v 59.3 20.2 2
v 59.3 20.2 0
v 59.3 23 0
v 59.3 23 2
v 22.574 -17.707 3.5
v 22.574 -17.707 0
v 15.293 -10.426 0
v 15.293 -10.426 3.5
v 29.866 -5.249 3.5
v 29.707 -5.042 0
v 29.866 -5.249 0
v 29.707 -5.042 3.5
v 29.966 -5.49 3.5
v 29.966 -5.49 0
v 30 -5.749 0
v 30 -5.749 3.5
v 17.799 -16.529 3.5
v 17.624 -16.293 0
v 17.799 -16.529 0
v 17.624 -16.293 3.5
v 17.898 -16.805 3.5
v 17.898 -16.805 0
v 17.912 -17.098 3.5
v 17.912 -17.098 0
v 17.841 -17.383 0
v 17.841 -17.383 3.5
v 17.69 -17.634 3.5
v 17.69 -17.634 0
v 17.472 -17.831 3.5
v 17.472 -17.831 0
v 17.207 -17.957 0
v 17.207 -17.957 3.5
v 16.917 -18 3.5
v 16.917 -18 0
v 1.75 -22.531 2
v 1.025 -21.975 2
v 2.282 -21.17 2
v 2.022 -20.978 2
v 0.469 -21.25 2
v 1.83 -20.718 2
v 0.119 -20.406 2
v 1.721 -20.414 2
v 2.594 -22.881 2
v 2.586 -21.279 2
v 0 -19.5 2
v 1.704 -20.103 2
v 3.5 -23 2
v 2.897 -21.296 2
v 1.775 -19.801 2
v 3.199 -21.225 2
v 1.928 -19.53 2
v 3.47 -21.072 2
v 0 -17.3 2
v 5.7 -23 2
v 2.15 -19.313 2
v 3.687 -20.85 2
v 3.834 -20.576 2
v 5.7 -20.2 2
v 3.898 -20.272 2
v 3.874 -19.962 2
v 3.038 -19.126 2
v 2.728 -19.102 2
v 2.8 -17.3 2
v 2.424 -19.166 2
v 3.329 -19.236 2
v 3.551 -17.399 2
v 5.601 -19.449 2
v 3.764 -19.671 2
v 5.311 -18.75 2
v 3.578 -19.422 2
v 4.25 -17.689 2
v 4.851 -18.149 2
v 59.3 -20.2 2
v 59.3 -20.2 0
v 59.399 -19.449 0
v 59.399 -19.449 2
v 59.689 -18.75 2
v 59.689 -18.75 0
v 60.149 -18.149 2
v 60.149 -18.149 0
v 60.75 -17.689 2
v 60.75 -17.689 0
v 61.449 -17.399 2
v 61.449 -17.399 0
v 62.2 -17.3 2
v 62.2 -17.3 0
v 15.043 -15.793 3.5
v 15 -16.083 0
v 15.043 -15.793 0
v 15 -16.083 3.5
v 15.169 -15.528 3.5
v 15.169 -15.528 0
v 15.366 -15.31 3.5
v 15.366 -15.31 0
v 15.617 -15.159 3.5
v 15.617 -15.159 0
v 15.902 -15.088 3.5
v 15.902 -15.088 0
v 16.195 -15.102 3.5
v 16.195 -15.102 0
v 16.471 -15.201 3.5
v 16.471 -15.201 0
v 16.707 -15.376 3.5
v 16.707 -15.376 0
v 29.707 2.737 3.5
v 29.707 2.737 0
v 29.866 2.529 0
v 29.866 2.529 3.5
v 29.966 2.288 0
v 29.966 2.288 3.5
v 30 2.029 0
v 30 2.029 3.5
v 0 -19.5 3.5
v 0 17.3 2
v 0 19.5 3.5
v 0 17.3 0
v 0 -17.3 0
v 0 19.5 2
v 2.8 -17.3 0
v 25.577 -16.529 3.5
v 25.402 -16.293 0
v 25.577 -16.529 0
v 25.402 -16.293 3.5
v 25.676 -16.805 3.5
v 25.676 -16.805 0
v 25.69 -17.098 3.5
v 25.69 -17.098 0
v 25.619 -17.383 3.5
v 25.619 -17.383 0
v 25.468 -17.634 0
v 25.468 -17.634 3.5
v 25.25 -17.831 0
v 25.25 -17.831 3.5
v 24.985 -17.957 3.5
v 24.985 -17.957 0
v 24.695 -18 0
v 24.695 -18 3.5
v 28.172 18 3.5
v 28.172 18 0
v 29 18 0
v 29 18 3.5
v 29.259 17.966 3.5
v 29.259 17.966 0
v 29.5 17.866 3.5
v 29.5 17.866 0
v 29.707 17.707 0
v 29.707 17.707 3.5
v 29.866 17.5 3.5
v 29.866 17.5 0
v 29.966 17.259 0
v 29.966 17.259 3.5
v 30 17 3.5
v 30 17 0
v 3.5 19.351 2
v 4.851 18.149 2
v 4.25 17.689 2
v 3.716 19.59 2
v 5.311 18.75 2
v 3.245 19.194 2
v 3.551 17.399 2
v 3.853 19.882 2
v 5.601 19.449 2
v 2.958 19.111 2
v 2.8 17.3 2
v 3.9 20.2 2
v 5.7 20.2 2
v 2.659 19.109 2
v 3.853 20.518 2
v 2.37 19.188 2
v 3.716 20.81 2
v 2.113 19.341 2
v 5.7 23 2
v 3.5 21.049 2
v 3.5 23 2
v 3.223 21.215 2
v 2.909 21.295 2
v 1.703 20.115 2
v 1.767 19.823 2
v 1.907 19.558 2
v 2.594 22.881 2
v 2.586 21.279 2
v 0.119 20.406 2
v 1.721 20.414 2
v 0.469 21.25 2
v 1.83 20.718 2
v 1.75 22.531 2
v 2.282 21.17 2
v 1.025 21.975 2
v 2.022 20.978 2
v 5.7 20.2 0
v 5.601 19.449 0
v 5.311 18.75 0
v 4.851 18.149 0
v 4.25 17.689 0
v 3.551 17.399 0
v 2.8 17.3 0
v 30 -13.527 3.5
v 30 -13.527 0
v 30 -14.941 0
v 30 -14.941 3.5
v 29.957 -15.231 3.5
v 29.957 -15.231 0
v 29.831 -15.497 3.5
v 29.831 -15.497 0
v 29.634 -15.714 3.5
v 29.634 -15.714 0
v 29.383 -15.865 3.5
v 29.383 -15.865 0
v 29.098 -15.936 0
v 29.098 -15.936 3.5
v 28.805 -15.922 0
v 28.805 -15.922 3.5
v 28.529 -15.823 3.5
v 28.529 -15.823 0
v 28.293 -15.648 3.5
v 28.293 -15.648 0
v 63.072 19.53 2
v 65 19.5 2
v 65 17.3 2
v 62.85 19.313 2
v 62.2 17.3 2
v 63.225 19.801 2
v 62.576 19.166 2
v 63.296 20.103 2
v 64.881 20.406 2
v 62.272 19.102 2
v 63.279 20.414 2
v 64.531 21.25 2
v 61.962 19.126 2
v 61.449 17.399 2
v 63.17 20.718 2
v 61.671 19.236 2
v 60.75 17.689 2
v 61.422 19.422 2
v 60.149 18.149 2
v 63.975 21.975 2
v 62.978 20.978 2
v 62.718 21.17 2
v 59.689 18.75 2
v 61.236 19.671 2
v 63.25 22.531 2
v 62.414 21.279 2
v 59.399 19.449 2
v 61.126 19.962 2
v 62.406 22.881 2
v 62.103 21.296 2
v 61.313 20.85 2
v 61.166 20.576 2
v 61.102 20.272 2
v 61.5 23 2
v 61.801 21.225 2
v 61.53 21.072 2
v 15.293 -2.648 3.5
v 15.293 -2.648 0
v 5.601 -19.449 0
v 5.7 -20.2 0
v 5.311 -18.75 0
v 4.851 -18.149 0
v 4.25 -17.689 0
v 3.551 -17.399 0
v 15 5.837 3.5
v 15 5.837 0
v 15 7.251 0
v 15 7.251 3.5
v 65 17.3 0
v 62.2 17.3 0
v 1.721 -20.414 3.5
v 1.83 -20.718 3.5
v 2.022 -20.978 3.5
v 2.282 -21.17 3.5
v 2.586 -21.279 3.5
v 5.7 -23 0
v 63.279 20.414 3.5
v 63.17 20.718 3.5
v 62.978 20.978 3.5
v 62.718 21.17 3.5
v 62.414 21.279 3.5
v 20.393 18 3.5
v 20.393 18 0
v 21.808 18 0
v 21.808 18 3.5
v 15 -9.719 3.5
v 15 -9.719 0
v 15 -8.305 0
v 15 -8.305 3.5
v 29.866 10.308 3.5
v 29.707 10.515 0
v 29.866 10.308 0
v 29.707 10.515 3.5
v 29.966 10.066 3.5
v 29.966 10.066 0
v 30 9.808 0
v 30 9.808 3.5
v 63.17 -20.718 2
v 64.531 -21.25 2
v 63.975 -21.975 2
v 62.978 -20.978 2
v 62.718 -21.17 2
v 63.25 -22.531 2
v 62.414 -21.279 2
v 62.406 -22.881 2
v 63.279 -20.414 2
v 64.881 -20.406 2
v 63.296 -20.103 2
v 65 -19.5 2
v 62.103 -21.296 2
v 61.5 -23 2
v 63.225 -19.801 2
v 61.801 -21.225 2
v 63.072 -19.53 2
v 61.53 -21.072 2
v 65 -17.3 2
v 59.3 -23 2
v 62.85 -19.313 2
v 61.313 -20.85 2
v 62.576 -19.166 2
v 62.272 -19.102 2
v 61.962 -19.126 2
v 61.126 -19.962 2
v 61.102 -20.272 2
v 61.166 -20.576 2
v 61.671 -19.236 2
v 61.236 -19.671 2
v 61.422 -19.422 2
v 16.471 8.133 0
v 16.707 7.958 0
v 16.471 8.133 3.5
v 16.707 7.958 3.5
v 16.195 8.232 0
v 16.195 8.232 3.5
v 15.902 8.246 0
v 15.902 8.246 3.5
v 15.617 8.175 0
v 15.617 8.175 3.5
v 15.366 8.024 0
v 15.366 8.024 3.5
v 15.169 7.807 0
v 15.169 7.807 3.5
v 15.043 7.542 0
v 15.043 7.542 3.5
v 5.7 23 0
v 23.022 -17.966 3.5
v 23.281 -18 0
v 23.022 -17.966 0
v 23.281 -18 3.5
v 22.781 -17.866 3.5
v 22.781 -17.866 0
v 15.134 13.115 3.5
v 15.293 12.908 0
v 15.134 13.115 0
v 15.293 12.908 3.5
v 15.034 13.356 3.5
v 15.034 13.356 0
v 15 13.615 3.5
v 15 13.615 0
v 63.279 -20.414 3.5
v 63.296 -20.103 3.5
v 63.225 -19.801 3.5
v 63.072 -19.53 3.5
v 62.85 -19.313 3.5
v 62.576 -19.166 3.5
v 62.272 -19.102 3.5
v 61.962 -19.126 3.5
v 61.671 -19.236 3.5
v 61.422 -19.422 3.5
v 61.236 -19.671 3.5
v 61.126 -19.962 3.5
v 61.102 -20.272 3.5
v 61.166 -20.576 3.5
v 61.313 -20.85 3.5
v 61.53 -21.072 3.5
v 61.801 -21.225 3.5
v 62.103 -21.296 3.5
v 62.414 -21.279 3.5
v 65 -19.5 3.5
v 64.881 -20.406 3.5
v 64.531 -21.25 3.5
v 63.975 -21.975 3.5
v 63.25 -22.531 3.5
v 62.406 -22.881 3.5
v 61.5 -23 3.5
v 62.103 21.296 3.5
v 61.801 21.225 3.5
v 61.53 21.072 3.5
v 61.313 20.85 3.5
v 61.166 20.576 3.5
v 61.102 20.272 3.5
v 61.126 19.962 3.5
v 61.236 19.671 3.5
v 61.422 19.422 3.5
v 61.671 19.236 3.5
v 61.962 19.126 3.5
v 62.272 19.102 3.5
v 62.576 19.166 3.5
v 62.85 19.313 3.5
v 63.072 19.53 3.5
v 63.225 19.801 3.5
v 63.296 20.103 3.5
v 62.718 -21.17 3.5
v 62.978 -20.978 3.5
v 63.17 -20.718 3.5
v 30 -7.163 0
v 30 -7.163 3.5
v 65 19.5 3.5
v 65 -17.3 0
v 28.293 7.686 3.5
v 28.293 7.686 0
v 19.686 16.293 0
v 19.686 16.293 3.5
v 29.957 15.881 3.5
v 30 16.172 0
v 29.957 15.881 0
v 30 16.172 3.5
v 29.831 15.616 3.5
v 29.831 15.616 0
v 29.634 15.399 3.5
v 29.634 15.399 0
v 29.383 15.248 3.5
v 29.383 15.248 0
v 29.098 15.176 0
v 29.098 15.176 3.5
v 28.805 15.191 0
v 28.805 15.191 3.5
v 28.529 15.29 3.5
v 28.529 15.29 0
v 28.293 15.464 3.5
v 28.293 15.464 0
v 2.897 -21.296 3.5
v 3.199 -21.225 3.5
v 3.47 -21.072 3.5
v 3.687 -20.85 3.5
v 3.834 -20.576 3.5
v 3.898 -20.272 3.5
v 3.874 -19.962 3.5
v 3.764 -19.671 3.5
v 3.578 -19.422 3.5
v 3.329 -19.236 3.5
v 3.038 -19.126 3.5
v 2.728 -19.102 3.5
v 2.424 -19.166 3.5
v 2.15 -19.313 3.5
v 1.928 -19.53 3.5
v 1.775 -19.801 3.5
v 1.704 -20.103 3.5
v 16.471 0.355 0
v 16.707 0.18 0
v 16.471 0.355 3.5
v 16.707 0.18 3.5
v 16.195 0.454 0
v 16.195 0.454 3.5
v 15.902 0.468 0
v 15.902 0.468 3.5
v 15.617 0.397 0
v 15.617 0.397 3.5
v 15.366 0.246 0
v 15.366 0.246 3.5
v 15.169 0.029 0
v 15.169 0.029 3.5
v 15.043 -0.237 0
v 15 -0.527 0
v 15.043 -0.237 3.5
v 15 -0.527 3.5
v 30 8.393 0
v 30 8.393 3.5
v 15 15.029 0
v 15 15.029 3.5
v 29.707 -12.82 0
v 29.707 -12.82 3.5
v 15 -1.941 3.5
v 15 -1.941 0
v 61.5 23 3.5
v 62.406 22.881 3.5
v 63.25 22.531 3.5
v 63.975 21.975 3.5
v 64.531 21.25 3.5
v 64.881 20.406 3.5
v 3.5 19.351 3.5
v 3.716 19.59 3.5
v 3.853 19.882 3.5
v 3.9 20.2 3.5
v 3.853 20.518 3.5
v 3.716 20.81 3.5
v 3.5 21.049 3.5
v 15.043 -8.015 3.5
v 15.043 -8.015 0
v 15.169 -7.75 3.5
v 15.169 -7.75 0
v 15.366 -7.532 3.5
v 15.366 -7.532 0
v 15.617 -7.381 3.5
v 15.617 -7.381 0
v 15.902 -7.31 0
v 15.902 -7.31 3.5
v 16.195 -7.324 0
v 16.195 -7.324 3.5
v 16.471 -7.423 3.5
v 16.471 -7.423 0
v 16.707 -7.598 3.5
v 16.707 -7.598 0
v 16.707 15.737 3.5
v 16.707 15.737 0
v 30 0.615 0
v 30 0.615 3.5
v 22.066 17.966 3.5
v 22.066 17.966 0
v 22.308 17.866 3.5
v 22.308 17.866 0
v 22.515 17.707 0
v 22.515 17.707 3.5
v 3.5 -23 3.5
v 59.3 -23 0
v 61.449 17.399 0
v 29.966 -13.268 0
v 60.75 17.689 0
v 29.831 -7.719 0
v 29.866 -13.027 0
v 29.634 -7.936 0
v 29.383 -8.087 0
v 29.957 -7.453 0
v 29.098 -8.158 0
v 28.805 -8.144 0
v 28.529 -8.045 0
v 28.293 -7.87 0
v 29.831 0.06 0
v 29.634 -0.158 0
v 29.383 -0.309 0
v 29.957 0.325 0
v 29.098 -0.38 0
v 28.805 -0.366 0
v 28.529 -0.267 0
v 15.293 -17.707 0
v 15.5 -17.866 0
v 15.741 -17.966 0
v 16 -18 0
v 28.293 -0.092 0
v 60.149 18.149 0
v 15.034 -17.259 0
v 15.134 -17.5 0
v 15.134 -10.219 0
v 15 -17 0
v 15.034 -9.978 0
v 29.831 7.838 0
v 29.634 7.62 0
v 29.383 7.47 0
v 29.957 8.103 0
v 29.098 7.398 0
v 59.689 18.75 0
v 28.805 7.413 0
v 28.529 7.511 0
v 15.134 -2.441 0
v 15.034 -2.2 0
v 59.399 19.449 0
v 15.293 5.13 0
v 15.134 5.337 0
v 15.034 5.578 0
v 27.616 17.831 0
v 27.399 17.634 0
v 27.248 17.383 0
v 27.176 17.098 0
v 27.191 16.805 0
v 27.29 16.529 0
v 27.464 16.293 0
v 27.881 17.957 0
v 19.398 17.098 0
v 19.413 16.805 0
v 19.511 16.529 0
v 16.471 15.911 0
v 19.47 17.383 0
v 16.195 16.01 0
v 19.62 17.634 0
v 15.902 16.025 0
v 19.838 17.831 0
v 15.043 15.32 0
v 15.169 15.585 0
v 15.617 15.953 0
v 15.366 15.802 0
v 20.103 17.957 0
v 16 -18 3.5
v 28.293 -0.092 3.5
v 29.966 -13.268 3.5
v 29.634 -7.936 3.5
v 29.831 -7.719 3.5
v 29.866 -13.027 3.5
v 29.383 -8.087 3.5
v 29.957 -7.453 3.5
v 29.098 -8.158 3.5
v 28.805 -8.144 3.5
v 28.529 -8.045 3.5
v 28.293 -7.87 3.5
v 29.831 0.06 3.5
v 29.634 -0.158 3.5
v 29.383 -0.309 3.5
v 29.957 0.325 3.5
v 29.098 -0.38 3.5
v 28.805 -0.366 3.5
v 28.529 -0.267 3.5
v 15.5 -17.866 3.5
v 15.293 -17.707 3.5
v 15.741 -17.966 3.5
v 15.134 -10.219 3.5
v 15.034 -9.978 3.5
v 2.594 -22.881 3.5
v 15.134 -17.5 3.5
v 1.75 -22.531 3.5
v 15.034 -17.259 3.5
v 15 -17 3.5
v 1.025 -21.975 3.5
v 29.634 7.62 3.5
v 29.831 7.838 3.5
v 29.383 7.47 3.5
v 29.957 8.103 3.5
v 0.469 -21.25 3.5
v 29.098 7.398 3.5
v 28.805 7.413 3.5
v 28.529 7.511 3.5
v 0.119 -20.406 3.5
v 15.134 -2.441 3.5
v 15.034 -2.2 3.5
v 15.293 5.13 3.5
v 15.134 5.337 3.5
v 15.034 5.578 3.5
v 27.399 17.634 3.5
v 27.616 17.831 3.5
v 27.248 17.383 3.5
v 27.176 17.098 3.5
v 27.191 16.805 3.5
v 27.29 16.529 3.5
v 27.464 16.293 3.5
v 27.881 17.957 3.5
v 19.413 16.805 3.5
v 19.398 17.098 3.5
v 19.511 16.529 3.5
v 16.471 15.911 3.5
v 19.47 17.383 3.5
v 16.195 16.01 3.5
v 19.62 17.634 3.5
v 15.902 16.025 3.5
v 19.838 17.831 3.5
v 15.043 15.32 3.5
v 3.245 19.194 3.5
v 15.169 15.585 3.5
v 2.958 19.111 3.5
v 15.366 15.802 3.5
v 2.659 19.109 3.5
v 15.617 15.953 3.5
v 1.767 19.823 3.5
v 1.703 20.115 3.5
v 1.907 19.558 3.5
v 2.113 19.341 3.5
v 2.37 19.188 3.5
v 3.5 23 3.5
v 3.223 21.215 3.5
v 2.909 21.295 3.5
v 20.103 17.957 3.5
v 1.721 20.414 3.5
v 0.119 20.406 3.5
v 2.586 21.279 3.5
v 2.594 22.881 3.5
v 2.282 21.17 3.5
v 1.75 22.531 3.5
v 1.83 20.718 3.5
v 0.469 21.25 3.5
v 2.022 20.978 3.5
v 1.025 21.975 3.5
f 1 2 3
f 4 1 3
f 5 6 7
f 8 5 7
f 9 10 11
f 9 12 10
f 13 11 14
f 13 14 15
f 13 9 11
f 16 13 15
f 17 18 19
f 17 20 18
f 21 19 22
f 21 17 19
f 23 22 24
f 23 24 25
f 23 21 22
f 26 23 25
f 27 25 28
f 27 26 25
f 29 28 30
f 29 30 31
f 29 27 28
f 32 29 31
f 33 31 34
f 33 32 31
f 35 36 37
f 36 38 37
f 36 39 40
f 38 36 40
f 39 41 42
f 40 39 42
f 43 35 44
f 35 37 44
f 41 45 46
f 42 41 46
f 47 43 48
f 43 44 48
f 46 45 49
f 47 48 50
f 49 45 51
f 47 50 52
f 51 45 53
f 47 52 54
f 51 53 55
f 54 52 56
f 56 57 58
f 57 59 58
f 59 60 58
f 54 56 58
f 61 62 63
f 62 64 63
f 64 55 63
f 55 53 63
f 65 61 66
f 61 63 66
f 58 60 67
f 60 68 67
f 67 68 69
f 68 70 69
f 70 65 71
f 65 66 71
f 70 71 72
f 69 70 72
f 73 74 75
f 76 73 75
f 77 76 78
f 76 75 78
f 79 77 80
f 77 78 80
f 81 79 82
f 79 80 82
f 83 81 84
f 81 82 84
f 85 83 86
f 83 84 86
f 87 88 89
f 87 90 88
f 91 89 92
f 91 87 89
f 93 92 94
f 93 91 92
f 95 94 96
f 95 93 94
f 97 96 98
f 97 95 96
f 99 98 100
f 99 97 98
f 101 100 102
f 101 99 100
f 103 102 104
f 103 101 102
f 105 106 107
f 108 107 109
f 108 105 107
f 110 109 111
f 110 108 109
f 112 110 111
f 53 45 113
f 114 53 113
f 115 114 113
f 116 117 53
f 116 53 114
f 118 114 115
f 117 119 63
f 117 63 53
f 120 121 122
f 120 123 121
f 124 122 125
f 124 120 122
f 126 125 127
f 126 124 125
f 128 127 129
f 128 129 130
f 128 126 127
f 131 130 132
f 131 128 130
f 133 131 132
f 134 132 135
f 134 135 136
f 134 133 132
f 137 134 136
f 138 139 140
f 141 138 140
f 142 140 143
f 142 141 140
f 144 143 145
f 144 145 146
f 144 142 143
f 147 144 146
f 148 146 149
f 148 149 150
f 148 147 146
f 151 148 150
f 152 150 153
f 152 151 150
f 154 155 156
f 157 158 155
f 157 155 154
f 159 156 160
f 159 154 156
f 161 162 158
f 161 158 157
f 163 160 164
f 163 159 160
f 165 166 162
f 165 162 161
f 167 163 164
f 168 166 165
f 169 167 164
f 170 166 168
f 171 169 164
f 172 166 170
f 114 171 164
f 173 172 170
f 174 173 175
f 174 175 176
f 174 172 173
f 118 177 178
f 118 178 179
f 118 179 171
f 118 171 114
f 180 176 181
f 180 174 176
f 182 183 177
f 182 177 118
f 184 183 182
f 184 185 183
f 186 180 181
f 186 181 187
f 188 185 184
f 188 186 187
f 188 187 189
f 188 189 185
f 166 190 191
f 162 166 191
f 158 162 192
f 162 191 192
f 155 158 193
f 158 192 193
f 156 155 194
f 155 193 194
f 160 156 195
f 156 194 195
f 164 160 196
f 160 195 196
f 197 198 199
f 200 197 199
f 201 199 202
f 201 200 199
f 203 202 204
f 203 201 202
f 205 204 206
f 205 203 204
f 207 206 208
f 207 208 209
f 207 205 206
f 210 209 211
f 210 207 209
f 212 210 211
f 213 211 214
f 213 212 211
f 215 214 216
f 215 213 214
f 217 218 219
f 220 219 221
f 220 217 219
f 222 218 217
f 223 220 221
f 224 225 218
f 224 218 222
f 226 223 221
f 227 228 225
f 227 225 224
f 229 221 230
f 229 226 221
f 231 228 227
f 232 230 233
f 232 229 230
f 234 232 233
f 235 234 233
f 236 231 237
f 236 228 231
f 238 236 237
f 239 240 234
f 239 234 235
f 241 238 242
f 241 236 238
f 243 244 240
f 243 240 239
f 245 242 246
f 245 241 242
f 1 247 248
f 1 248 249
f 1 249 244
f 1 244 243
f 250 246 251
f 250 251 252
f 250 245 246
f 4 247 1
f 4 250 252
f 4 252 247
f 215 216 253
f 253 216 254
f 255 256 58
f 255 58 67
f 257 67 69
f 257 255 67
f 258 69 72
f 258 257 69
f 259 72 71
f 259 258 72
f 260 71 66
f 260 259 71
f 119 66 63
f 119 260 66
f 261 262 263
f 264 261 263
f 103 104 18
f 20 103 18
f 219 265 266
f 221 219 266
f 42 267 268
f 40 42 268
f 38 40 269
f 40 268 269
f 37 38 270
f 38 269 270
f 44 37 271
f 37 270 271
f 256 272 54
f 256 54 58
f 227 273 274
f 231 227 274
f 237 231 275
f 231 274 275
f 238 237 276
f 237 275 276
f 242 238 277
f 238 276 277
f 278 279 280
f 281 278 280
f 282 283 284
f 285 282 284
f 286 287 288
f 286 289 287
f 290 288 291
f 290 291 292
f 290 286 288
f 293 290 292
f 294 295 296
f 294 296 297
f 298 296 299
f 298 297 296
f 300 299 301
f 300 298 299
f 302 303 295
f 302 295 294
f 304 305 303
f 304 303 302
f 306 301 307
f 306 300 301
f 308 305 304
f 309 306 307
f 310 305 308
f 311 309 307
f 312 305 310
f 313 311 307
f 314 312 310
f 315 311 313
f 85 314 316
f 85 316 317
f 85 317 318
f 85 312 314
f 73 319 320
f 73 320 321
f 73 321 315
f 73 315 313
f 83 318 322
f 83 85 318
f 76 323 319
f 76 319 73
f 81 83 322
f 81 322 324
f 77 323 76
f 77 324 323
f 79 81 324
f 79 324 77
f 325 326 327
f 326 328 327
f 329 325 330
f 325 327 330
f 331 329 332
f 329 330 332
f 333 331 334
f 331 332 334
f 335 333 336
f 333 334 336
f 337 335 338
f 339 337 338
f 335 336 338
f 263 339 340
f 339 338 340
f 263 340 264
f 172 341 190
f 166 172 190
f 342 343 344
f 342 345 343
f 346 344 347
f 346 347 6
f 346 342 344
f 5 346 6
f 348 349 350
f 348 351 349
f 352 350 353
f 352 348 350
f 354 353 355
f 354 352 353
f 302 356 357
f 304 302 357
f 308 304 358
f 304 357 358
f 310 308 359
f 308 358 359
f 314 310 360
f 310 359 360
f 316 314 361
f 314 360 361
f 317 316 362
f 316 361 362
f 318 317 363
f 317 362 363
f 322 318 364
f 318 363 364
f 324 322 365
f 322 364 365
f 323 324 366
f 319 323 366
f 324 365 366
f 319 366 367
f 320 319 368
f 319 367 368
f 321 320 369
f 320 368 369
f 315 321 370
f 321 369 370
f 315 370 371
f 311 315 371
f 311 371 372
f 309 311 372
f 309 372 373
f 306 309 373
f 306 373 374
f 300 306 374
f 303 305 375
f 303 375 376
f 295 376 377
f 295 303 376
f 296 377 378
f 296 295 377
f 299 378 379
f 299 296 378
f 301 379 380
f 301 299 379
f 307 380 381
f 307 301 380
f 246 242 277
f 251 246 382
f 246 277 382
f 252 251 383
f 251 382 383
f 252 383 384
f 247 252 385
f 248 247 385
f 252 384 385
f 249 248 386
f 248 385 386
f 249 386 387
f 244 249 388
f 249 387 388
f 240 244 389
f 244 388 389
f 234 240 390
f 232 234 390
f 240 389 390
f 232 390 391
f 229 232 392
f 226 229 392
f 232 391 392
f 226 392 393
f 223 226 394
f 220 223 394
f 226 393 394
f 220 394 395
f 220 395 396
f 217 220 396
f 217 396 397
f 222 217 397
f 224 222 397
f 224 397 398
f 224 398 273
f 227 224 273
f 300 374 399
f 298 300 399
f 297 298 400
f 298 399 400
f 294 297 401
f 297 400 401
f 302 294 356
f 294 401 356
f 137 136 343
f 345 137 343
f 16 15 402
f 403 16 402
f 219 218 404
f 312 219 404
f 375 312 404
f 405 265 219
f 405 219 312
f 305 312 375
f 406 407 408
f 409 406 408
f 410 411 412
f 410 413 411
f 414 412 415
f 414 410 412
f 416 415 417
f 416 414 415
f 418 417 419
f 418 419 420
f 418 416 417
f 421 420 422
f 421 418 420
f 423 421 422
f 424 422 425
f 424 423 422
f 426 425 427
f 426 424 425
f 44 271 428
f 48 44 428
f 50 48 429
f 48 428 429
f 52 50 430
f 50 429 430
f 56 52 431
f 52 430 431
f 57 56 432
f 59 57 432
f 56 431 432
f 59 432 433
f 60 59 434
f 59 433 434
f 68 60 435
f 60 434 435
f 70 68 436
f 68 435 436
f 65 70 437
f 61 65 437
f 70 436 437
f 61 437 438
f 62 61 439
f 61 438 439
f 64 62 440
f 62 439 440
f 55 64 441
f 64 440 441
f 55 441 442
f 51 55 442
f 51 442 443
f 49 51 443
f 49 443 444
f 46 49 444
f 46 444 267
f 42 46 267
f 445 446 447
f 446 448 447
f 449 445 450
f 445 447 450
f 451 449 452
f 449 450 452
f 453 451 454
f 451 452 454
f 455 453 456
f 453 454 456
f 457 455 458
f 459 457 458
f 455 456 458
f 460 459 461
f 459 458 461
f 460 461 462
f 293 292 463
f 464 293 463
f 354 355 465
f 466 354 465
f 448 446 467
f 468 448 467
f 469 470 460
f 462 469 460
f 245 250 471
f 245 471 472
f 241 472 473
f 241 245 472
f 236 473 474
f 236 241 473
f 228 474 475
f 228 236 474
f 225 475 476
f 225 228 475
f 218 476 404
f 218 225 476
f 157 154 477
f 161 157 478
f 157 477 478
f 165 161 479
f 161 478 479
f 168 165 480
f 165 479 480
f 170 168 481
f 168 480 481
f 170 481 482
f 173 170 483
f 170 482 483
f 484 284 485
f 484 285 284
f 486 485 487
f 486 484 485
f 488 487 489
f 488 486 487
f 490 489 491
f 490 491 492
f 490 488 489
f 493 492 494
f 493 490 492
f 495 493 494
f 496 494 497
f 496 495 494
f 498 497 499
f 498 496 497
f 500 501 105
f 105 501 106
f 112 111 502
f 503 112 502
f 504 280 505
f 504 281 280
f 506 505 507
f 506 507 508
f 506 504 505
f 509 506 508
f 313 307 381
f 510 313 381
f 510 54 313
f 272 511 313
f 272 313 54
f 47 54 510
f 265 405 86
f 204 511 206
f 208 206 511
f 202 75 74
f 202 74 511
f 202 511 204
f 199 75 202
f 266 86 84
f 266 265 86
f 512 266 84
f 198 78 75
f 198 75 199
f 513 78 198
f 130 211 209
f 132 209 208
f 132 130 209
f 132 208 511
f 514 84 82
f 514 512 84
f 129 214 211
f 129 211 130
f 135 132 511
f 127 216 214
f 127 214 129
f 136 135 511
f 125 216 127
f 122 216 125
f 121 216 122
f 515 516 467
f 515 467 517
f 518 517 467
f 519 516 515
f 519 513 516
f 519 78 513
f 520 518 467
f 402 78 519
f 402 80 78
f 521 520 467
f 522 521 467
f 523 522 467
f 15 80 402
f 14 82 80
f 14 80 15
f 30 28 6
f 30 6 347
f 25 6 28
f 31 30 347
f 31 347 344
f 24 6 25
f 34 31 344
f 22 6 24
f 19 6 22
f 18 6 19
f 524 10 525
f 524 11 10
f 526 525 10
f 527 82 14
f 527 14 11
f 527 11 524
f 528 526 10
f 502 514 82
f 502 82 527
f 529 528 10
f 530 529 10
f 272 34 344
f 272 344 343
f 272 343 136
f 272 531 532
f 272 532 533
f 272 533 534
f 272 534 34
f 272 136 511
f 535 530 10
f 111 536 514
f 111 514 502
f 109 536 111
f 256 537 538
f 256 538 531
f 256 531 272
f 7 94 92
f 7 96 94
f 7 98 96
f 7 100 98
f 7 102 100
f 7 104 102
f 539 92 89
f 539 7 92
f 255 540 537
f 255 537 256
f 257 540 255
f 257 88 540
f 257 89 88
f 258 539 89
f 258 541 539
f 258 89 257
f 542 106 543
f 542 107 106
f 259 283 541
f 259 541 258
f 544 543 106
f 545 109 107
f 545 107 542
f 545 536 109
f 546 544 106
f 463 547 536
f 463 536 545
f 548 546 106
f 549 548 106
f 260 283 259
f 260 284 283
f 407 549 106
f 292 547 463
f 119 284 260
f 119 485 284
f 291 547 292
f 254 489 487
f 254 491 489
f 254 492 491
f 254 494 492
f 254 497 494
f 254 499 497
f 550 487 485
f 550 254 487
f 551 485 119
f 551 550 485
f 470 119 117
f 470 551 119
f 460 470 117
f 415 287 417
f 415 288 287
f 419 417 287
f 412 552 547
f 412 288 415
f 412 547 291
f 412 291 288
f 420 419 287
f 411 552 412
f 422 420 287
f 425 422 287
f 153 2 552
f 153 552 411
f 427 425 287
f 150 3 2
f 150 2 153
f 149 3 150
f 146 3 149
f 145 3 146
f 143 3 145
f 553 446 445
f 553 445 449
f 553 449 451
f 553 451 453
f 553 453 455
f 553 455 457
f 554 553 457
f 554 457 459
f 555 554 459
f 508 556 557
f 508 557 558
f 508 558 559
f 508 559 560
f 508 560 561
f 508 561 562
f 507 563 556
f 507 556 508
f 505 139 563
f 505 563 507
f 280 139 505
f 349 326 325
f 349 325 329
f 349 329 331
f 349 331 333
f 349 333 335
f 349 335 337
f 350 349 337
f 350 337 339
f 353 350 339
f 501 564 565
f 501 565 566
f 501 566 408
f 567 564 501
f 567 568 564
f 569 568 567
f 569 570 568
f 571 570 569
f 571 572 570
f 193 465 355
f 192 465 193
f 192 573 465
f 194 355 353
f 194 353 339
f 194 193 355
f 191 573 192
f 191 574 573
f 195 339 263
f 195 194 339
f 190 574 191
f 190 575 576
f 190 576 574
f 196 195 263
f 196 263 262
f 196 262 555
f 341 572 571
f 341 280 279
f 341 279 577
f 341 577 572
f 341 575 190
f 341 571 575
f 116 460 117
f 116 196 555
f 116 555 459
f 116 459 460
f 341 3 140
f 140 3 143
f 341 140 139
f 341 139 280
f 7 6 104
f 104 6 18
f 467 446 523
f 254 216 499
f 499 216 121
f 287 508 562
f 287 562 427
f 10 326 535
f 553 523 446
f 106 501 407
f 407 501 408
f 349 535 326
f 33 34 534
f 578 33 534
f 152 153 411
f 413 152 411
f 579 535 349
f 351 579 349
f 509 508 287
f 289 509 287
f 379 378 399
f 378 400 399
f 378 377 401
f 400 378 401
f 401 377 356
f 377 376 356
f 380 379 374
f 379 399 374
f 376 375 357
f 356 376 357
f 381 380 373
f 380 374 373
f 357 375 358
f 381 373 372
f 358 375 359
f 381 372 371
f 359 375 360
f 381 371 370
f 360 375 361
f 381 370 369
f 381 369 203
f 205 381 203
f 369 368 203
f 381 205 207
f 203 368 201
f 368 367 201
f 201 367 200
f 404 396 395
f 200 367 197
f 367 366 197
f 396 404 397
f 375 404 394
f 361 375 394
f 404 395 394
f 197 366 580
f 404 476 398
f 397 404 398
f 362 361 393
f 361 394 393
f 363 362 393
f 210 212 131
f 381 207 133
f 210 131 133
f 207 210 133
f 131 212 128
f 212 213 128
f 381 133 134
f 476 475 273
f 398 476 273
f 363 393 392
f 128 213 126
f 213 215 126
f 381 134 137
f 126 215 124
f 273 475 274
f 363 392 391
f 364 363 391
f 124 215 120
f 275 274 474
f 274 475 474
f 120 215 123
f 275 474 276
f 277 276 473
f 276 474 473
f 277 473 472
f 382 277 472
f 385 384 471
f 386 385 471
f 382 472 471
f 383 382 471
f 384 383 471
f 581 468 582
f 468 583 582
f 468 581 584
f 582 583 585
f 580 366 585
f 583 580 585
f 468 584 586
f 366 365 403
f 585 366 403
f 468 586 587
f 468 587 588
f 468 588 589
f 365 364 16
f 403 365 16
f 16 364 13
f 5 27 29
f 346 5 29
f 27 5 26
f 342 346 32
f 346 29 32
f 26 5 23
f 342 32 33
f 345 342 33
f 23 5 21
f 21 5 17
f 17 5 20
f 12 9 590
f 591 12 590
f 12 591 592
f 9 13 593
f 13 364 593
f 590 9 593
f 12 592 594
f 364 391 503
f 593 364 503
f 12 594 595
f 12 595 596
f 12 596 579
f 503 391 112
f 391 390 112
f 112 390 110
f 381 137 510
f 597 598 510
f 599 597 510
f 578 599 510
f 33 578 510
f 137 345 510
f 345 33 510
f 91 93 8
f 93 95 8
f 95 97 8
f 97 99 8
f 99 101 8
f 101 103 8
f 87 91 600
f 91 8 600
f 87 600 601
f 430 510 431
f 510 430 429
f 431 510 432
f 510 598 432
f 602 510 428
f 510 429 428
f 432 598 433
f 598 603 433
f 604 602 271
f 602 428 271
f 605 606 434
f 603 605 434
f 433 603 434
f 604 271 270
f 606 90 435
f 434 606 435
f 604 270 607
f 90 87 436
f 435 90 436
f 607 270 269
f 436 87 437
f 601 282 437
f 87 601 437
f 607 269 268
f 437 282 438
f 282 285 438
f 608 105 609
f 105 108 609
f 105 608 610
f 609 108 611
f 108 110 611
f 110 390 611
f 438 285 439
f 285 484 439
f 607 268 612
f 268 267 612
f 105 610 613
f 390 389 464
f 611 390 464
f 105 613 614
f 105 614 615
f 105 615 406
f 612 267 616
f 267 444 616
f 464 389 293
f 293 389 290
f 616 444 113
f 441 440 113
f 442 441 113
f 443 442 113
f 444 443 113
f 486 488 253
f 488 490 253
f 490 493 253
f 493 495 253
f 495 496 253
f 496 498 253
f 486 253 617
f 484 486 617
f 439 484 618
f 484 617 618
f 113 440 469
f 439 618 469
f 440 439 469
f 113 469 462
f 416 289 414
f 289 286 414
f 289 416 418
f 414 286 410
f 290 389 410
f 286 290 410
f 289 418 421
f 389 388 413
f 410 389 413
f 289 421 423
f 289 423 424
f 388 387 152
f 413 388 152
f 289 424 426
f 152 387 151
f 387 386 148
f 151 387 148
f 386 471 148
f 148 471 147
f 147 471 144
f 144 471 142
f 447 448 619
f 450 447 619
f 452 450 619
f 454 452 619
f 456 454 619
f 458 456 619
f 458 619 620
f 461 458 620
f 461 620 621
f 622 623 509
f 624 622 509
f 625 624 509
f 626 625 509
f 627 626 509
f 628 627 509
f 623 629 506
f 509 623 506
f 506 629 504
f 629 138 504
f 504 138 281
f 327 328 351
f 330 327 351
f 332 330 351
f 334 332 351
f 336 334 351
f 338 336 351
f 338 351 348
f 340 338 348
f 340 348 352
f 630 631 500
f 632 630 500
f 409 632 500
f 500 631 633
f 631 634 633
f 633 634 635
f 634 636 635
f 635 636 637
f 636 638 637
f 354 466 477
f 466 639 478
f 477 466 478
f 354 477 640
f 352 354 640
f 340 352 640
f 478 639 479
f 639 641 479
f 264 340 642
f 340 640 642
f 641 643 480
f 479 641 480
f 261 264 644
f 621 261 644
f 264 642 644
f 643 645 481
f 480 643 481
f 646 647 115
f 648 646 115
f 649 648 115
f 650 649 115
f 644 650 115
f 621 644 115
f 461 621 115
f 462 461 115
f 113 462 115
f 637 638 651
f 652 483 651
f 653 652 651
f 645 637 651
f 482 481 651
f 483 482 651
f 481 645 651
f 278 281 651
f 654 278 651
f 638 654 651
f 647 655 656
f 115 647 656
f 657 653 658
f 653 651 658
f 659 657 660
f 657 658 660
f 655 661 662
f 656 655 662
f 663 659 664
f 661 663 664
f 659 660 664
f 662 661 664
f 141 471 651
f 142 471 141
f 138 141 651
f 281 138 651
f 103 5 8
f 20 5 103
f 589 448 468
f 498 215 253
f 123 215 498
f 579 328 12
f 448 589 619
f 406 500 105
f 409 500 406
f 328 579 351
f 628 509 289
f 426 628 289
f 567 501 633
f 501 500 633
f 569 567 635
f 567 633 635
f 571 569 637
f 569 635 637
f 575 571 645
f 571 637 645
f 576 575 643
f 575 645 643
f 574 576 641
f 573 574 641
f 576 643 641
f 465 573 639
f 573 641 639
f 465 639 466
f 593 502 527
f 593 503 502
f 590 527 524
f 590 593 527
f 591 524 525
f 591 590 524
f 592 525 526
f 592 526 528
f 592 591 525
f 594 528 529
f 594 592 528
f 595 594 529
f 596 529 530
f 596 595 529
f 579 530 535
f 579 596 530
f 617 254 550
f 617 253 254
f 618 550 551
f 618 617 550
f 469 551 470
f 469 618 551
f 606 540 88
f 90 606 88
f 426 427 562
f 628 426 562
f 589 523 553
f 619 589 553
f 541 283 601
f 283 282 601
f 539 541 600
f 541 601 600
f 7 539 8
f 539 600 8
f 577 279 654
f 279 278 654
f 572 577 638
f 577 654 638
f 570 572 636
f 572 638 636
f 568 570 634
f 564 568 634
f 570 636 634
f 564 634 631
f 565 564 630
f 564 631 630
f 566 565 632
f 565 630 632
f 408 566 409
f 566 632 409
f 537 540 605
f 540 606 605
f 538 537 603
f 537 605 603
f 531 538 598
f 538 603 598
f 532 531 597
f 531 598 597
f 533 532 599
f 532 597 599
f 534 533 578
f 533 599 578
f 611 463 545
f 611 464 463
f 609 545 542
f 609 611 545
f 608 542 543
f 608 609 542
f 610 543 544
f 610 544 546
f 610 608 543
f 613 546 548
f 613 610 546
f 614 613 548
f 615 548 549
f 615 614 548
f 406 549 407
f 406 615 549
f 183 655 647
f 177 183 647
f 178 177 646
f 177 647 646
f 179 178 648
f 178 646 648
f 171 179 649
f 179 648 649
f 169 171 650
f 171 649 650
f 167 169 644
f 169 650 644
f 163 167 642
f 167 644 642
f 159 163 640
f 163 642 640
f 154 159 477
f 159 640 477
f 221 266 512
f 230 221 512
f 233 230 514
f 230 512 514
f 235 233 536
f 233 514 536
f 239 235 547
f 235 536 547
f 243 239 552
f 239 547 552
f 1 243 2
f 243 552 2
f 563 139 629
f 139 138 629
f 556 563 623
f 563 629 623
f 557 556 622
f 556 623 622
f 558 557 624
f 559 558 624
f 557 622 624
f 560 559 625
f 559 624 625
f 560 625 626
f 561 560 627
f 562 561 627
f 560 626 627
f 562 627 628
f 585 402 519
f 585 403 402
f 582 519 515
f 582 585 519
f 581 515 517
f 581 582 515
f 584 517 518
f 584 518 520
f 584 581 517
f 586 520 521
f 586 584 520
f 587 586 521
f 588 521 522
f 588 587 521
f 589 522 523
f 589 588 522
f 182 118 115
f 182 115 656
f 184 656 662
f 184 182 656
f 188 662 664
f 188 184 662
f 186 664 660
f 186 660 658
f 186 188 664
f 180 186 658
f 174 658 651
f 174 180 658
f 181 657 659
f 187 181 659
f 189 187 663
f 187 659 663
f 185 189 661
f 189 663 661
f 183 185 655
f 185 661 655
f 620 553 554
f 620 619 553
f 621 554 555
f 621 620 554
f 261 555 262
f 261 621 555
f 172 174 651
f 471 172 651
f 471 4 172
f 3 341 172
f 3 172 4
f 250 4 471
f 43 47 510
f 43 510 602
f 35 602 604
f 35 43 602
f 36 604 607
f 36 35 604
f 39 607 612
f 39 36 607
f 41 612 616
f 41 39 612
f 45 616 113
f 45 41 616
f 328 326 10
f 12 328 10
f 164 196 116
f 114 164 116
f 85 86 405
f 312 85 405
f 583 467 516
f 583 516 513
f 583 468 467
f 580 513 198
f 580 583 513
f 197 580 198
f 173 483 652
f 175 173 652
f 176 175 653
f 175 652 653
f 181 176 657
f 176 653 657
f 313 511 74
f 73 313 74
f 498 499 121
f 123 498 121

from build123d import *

# Parameters (mm, degrees)
BOSS_EXTRUDE1_DEPTH = 3.5
CUT_EXTRUDE1_DEPTH  = 10
CUT_EXTRUDE2_DEPTH  = 2
CUT_EXTRUDE3_DEPTH  = 4
FILLET2_R           = 1


with BuildPart() as part:
    # Sketch1 → Boss-Extrude1 (new body)
    with BuildSketch(Plane.XY):
        with BuildLine():
            Line((3.5, 23), (61.5, 23))
            ThreePointArc((61.5, 23), (63.974873734, 21.974873734), (65, 19.5))
            Line((65, 19.5), (65, -19.5))
            ThreePointArc((65, -19.5), (63.974873734, -21.974873734), (61.5, -23))
            Line((61.5, -23), (3.5, -23))
            ThreePointArc((3.5, -23), (1.025126266, -21.974873734), (0, -19.5))
            Line((0, -19.5), (0, 19.5))
            ThreePointArc((0, 19.5), (1.025126266, 21.974873734), (3.5, 23))
        make_face()
    extrude(amount=BOSS_EXTRUDE1_DEPTH)

    # Sketch2 → Cut-Extrude1 (cut)
    with BuildSketch(Plane.XY.offset(3.5)):
        with BuildLine():
            ThreePointArc((1.720986059, -20.413843202), (2.022182541, -20.977817459), (2.586156798, -21.279013941))
            ThreePointArc((2.586156798, -21.279013941), (3.577817459, -19.422182541), (1.720986059, -20.413843202))
        make_face()
        with BuildLine():
            ThreePointArc((2.586156798, 21.279013941), (2.022182541, 20.977817459), (1.720986059, 20.413843202))
            ThreePointArc((1.720986059, 20.413843202), (2.236022068, 19.255580129), (3.5, 19.351471863))
            ThreePointArc((3.5, 19.351471863), (3.9, 20.2), (3.5, 21.048528137))
            ThreePointArc((3.5, 21.048528137), (3.069013075, 21.266598315), (2.586156798, 21.279013941))
        make_face()
        with BuildLine():
            ThreePointArc((62.413843202, -21.279013941), (62.977817459, -20.977817459), (63.279013941, -20.413843202))
            ThreePointArc((63.279013941, -20.413843202), (61.422182541, -19.422182541), (62.413843202, -21.279013941))
        make_face()
        with BuildLine():
            ThreePointArc((63.279013941, 20.413843202), (62.977817459, 20.977817459), (62.413843202, 21.279013941))
            ThreePointArc((62.413843202, 21.279013941), (61.422182541, 19.422182541), (63.279013941, 20.413843202))
        make_face()
    extrude(amount=-CUT_EXTRUDE1_DEPTH, mode=Mode.SUBTRACT)

    # Sketch3 → Cut-Extrude2 (cut)
    with BuildSketch(Plane(origin=(0, 0, 0), x_dir=(-1, 0, 0), z_dir=(0, 0, -1))):
        with BuildLine():
            Line((-2.8, -17.3), (0, -17.3))
            Line((0, -17.3), (0, -19.5))
            ThreePointArc((0, -19.5), (-1.025126266, -21.974873734), (-3.5, -23))
            Line((-3.5, -23), (-5.7, -23))
            Line((-5.7, -23), (-5.7, -20.2))
            ThreePointArc((-5.7, -20.2), (-4.850609665, -18.149390335), (-2.8, -17.3))
        make_face()
        with BuildLine():
            Line((-2.8, 17.3), (0, 17.3))
            Line((0, 17.3), (0, 19.5))
            ThreePointArc((0, 19.5), (-1.025126266, 21.974873734), (-3.5, 23))
            Line((-3.5, 23), (-5.7, 23))
            Line((-5.7, 23), (-5.7, 20.2))
            ThreePointArc((-5.7, 20.2), (-4.850609665, 18.149390335), (-2.8, 17.3))
        make_face()
        with BuildLine():
            Line((-59.3, 20.2), (-59.3, 23))
            Line((-59.3, 23), (-61.5, 23))
            ThreePointArc((-61.5, 23), (-63.974873734, 21.974873734), (-65, 19.5))
            Line((-65, 19.5), (-65, 17.3))
            Line((-65, 17.3), (-62.2, 17.3))
            ThreePointArc((-62.2, 17.3), (-60.149390335, 18.149390335), (-59.3, 20.2))
        make_face()
        with BuildLine():
            Line((-62.2, -17.3), (-65, -17.3))
            Line((-65, -17.3), (-65, -19.5))
            ThreePointArc((-65, -19.5), (-63.974873734, -21.974873734), (-61.5, -23))
            Line((-61.5, -23), (-59.3, -23))
            Line((-59.3, -23), (-59.3, -20.2))
            ThreePointArc((-59.3, -20.2), (-60.149390335, -18.149390335), (-62.2, -17.3))
        make_face()
    extrude(amount=-CUT_EXTRUDE2_DEPTH, mode=Mode.SUBTRACT)

    # Sketch4 → Cut-Extrude3 (cut)
    with BuildSketch(Plane(origin=(0, 0, 0), x_dir=(-1, 0, 0), z_dir=(0, 0, -1))):
        Polygon((-25.757359313, 18), (-30, 18), (-30, 13.757359313), align=None)
        Polygon((-17.97918472, 18), (-22.221825407, 18), (-30, 10.221825407), (-30, 5.97918472), align=None)
        Polygon((-15, 17.443650814), (-30, 2.443650814), (-30, -1.798989873), (-15, 13.201010127), align=None)
        Polygon((-15, 9.665476221), (-30, -5.334523779), (-30, -9.577164466), (-15, 5.422835534), align=None)
        Polygon((-15, 1.887301628), (-30, -13.112698372), (-30, -17.355339059), (-15, -2.355339059), align=None)
        Polygon((-15, -10.133513652), (-15, -5.890872965), (-27.109127035, -18), (-22.866486348, -18), align=None)
        Polygon((-15, -18), (-15, -13.669047558), (-19.330952442, -18), align=None)
    extrude(amount=-CUT_EXTRUDE3_DEPTH, mode=Mode.SUBTRACT)

    # Fillet2
    fillet2_edges = [part.edges().sort_by_distance(p)[0] for p in [
        (30, -9.577164466, 1.75),
        (30, -5.334523779, 1.75),
        (15, 9.665476221, 1.75),
        (15, 5.422835534, 1.75),
        (30, -17.355339059, 1.75),
        (30, -13.112698372, 1.75),
        (15, 1.887301628, 1.75),
        (15, -2.355339059, 1.75),
        (30, 5.97918472, 1.75),
        (30, 10.221825407, 1.75),
        (22.221825407, 18, 1.75),
        (17.97918472, 18, 1.75),
        (30, -1.798989873, 1.75),
        (30, 2.443650814, 1.75),
        (15, 17.443650814, 1.75),
        (15, 13.201010127, 1.75),
        (19.330952442, -18, 1.75),
        (15, -13.669047558, 1.75),
        (15, -18, 1.75),
        (22.866486348, -18, 1.75),
        (27.109127035, -18, 1.75),
        (15, -5.890872965, 1.75),
        (15, -10.133513652, 1.75),
        (30, 13.757359313, 1.75),
        (30, 18, 1.75),
        (25.757359313, 18, 1.75),
    ]]
    fillet(fillet2_edges, radius=FILLET2_R)


solid = part.part
